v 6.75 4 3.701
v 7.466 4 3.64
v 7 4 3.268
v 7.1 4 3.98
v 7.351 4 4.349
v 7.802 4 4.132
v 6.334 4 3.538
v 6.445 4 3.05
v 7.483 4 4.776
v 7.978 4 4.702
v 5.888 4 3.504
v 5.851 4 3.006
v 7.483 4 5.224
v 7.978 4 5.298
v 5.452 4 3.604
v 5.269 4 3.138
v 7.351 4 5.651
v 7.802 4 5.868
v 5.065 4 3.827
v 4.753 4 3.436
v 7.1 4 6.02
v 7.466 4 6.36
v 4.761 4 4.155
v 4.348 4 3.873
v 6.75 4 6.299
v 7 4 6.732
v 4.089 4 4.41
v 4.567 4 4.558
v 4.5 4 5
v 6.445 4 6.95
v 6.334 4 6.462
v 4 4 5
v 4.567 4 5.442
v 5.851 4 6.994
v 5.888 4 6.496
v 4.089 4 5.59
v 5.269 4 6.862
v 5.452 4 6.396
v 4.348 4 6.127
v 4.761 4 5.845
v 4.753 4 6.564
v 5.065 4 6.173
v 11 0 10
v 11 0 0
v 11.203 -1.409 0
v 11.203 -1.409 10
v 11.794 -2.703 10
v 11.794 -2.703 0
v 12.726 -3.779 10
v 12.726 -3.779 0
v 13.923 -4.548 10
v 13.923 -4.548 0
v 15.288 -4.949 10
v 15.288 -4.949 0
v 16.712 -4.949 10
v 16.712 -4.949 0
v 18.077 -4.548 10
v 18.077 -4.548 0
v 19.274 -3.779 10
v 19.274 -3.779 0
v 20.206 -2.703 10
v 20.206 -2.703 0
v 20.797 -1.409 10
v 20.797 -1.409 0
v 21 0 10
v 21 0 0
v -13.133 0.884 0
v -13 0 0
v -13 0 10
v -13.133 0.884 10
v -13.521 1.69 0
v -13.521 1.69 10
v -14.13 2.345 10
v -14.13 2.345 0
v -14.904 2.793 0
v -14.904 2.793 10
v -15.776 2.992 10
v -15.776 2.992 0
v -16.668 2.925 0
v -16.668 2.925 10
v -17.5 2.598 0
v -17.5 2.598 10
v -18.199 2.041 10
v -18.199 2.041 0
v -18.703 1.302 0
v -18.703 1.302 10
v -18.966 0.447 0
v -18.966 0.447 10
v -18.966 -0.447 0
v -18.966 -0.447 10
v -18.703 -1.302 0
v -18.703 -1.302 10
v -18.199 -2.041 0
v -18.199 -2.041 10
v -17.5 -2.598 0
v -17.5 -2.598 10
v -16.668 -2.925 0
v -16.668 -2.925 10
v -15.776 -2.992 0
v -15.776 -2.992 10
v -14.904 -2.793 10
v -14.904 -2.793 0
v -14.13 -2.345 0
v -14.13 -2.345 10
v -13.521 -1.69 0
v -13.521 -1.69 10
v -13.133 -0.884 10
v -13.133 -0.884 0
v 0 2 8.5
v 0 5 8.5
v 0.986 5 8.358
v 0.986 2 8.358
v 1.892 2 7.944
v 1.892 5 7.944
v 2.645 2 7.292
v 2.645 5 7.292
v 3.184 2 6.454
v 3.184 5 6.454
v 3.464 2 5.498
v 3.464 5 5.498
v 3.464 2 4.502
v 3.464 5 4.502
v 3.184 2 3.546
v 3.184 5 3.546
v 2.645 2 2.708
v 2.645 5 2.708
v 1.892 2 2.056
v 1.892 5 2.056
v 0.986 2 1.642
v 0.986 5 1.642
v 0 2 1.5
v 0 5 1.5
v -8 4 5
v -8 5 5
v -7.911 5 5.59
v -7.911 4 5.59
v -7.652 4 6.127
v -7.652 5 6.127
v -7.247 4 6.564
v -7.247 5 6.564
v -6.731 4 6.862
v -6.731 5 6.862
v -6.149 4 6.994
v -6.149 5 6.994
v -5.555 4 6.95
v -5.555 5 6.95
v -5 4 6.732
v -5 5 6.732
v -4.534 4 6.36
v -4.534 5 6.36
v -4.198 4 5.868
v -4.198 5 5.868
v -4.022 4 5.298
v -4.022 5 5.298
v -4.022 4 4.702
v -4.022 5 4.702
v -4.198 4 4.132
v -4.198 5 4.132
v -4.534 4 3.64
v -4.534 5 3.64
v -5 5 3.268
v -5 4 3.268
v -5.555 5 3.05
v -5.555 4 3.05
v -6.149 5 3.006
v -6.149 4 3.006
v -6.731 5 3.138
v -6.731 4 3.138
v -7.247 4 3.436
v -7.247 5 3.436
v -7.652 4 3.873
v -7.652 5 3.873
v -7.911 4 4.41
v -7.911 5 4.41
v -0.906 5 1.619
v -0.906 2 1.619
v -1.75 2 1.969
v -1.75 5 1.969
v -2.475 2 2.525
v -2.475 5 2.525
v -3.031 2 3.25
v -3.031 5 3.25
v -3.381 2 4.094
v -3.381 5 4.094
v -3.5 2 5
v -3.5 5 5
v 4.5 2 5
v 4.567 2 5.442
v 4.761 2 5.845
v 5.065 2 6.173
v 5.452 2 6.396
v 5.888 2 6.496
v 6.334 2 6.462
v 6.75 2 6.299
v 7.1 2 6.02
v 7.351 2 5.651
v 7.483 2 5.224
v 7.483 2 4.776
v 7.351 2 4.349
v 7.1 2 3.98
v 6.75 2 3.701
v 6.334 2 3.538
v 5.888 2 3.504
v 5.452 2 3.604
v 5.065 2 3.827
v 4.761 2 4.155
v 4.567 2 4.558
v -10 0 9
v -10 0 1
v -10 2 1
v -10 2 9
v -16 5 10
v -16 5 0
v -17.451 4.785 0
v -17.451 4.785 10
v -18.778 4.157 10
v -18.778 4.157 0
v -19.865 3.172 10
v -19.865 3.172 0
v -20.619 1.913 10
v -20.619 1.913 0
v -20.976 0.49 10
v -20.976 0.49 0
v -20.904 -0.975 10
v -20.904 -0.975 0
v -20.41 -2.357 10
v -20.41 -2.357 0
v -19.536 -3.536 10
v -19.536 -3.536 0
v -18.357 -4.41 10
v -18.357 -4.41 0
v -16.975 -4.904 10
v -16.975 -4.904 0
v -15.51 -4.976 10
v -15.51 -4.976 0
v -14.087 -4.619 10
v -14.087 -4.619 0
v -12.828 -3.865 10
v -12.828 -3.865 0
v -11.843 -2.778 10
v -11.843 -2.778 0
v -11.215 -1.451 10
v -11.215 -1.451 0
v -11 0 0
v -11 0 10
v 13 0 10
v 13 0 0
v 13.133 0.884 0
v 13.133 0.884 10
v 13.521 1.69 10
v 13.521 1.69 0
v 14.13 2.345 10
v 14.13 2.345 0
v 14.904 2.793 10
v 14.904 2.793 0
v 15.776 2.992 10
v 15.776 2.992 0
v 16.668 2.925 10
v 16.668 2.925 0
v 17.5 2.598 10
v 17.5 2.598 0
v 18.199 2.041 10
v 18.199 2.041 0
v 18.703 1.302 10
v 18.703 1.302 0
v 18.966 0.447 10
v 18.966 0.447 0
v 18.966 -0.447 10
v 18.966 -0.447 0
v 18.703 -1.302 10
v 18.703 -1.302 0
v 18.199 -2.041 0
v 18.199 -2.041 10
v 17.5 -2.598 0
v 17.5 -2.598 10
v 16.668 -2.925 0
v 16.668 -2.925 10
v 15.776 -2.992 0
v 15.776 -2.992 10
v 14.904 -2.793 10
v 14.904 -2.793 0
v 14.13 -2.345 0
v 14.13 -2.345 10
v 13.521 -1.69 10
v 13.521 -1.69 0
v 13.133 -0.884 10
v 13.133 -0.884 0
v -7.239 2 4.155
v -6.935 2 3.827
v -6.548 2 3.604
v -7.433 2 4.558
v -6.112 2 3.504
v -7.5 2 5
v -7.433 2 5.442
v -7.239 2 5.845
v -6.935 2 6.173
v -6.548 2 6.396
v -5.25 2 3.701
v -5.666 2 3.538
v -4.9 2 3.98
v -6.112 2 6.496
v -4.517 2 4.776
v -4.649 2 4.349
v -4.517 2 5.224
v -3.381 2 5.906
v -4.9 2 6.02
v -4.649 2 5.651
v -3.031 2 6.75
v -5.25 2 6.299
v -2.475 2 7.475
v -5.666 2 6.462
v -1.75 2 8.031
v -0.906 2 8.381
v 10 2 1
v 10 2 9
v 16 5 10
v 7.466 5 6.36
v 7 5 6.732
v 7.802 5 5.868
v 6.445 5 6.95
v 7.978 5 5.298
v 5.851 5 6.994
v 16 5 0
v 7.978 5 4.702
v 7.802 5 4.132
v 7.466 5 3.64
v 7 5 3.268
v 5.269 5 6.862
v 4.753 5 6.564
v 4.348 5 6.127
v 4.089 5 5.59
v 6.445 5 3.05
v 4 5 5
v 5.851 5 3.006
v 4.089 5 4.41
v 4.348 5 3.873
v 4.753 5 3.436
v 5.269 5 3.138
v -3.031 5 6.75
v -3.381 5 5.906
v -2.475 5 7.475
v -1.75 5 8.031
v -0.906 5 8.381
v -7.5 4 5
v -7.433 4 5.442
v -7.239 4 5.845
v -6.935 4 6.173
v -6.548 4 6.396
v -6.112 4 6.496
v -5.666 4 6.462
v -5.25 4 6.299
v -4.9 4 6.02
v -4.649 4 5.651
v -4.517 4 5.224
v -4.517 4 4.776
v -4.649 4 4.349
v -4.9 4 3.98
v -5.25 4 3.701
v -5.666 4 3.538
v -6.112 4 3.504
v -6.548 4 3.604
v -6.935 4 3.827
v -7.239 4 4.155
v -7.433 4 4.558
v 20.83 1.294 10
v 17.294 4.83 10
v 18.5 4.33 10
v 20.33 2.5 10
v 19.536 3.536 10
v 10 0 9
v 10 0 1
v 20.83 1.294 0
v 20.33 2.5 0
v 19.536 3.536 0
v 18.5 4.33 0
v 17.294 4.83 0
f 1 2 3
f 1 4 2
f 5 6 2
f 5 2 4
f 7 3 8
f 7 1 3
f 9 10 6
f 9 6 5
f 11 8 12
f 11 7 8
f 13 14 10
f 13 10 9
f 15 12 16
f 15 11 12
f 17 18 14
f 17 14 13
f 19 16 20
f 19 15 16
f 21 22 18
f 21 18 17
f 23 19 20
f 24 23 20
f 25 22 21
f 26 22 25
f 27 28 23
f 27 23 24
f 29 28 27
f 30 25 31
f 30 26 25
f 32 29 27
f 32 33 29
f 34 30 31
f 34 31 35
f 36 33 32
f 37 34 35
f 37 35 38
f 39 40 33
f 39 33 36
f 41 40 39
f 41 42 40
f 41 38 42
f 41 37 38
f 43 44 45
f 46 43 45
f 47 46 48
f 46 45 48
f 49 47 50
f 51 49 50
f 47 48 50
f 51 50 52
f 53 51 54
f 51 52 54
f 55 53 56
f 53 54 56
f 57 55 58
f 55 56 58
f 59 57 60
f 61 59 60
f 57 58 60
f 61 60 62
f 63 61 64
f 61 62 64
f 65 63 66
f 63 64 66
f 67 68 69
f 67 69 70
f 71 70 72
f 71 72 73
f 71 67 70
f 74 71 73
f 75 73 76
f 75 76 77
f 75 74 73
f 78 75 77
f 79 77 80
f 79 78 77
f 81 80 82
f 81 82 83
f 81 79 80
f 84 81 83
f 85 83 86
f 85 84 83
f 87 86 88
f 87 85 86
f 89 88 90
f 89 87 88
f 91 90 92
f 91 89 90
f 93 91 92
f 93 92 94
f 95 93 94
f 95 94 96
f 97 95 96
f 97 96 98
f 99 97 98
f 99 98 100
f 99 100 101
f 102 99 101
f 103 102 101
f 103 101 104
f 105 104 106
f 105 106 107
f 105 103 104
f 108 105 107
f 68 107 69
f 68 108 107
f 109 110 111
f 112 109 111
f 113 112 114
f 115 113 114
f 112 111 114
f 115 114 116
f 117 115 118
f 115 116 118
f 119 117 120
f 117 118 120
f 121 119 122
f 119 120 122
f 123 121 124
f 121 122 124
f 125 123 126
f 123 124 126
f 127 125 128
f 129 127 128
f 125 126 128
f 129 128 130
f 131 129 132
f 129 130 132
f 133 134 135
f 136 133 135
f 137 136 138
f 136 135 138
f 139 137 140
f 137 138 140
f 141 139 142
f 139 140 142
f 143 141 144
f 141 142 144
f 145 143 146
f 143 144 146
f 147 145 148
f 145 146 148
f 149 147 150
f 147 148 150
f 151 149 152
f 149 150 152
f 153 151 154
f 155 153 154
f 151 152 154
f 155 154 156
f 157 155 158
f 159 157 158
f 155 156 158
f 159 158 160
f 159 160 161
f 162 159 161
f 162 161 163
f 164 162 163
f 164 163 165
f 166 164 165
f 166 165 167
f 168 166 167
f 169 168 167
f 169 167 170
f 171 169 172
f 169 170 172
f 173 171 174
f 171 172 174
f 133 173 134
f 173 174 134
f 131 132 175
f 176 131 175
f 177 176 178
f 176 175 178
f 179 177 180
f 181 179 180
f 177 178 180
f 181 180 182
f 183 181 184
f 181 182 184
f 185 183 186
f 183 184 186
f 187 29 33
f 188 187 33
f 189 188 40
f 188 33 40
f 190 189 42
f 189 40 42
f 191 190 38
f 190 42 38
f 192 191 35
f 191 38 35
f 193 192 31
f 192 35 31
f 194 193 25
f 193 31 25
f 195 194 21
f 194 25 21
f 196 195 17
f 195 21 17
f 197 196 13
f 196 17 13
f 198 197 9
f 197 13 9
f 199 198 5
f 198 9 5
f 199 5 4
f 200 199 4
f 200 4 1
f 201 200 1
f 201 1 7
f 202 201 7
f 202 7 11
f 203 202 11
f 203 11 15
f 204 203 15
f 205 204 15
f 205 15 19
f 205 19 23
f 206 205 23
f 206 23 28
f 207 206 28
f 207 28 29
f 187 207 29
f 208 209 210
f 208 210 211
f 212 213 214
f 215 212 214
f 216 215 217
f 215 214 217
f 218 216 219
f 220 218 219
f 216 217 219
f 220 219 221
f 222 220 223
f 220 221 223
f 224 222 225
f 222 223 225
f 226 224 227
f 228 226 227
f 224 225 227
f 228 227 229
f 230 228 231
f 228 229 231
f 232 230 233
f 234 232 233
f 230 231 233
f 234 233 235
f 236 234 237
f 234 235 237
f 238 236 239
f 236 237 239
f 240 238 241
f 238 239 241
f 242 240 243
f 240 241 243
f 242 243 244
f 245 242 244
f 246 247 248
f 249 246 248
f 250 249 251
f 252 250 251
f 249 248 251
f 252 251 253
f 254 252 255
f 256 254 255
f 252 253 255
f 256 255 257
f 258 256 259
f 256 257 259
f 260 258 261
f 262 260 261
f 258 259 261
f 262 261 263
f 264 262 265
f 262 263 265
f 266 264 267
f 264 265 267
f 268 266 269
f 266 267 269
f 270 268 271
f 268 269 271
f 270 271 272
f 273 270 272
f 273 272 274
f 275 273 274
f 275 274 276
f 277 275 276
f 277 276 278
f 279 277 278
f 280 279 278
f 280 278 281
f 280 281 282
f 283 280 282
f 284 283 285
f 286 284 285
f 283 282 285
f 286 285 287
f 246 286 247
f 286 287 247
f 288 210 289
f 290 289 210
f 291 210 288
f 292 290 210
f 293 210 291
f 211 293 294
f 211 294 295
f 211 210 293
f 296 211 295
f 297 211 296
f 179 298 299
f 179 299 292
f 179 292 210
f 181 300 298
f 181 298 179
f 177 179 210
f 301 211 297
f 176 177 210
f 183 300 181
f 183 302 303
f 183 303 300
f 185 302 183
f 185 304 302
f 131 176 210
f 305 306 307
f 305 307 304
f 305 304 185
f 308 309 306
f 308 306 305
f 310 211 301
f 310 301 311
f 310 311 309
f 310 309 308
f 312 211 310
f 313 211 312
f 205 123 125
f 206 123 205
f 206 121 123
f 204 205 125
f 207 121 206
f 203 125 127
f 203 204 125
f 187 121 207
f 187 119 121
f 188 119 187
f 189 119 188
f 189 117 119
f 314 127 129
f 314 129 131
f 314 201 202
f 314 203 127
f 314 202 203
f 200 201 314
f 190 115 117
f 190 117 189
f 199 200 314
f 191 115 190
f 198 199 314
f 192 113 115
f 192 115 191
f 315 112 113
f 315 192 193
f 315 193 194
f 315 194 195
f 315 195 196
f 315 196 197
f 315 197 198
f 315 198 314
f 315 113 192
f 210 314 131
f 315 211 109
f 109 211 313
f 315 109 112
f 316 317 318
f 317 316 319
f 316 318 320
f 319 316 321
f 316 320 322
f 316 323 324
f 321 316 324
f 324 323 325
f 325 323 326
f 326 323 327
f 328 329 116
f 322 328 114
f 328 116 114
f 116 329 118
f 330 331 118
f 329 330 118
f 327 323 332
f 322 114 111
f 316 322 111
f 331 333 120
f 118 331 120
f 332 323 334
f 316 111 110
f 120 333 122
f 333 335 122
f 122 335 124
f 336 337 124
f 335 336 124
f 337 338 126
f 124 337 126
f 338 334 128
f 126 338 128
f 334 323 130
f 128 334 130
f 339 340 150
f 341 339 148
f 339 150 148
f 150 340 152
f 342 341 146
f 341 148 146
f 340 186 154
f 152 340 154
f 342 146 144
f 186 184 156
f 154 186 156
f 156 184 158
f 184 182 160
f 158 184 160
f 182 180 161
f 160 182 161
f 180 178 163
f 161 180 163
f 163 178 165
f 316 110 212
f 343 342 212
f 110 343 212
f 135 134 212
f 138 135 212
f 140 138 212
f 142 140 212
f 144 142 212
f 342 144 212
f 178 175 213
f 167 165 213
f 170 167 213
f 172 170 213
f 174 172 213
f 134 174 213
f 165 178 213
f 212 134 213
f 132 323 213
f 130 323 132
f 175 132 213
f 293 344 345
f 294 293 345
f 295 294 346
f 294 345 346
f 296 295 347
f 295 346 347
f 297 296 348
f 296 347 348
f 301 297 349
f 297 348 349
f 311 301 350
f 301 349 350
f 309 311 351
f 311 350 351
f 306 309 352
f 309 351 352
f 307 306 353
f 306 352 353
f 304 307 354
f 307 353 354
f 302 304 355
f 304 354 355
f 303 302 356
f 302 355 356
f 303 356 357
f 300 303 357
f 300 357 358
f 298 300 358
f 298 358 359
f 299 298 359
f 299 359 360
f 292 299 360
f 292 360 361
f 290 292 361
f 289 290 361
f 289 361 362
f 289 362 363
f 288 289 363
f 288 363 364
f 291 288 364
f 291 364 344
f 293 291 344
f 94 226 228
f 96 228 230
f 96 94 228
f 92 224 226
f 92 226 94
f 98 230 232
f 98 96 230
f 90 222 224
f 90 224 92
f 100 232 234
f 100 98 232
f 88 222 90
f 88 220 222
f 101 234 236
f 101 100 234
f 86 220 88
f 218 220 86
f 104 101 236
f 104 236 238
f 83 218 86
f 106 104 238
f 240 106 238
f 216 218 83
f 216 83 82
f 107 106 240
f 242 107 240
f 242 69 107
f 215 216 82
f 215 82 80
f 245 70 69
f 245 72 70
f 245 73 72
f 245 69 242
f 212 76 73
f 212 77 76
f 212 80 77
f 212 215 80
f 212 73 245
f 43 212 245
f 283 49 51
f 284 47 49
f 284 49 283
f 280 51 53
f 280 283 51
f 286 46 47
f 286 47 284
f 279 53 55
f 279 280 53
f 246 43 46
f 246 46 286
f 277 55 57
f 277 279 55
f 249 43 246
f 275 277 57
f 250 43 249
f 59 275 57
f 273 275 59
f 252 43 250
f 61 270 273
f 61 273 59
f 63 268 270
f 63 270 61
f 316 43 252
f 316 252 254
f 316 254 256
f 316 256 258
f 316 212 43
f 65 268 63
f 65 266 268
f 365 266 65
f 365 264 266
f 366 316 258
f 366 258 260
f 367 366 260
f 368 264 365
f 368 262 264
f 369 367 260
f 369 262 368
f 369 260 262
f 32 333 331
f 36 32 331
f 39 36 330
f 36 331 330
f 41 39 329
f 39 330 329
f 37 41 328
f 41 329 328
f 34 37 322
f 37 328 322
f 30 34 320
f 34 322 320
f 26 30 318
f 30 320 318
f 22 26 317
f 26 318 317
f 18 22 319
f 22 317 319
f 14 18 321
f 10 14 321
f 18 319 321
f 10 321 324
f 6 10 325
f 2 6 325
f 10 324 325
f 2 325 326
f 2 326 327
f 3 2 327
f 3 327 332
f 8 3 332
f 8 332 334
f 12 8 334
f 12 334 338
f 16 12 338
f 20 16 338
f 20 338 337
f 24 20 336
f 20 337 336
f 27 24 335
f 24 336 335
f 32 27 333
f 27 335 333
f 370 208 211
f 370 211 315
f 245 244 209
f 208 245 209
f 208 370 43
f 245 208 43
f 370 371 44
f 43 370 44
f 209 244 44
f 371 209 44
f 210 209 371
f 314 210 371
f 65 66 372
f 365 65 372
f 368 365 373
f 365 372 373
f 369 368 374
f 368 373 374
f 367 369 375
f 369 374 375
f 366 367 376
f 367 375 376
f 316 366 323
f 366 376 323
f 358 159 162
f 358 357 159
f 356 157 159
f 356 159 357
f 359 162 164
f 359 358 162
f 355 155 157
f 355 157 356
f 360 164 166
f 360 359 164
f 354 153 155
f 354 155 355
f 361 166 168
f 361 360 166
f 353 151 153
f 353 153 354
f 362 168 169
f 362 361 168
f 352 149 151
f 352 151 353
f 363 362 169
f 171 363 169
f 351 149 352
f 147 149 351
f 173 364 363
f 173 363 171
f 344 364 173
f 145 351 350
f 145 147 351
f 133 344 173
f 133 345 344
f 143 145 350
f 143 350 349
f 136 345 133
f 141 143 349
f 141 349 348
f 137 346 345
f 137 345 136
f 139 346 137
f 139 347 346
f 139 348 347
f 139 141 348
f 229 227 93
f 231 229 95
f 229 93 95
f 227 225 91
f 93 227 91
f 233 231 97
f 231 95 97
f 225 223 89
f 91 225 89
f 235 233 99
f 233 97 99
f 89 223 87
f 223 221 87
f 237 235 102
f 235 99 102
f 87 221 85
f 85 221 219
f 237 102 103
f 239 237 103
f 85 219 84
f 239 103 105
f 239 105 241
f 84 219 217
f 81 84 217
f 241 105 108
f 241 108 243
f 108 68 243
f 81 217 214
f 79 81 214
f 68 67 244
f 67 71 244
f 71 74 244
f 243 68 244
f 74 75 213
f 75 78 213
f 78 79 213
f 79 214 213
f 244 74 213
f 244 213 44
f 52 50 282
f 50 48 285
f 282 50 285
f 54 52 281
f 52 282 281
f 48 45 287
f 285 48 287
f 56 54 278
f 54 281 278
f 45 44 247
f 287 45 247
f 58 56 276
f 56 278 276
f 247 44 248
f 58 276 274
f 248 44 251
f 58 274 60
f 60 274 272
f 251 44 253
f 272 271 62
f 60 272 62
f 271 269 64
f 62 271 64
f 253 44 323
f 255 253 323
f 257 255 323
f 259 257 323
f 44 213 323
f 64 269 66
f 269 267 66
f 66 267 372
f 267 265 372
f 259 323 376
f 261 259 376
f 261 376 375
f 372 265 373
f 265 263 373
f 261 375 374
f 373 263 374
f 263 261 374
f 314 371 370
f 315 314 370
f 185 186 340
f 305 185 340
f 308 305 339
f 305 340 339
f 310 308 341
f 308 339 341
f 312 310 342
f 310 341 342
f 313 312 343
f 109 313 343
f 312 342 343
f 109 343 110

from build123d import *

# Parameters (mm, degrees)
F0_R     = 3
F1_DEPTH = 10
F2_W     = 20
F2_H     = 8
F3_DEPTH = 2
F4_R     = 1.5
F5_DEPTH = 5
F6_R     = 2
F7_DEPTH = 1


with BuildPart() as f1:
    # F0 (on Top) → F1 (new body)
    with BuildSketch(Plane.XY):
        with BuildLine():
            ThreePointArc((-16, 5), (-19.5355339059, -3.5355339059), (-11, 0))
            ThreePointArc((-11, 0), (-12.4644660941, 3.5355339059), (-16, 5))
        make_face()
        with Locations((-16, 0)):
            Circle(F0_R, mode=Mode.SUBTRACT)
        with BuildLine():
            ThreePointArc((-16, 5), (-12.4644660941, 3.5355339059), (-11, 0))
            Line((-11, 0), (11, 0))
            ThreePointArc((11, 0), (12.4644660941, 3.5355339059), (16, 5))
            Line((16, 5), (-16, 5))
        make_face()
        with BuildLine():
            ThreePointArc((16, 5), (12.4644660941, 3.5355339059), (11, 0))
            ThreePointArc((11, 0), (16, -5), (21, 0))
            ThreePointArc((21, 0), (19.5355339059, 3.5355339059), (16, 5))
        make_face()
        with BuildLine():
            ThreePointArc((19, 0), (16, -3), (13, 0))
            ThreePointArc((13, 0), (16, 3), (19, 0))
        make_face(mode=Mode.SUBTRACT)
    extrude(amount=F1_DEPTH)

    # F2 (on face) → F3 (cut)
    with BuildSketch(Plane.XZ):
        with Locations((0, 5)):
            Rectangle(F2_W, F2_H)
    extrude(amount=-F3_DEPTH, mode=Mode.SUBTRACT)

    # F4 (on face) → F5 (cut)
    with BuildSketch(Plane(origin=(0, 5, 0), x_dir=(-1, 0, 0), z_dir=(0, 1, 0))):
        with BuildLine():
            ThreePointArc((3.5, 5), (2.4748737342, 7.4748737342), (0, 8.5))
            Line((0, 8.5), (0, 1.5))
            ThreePointArc((0, 1.5), (2.4748737342, 2.5251262658), (3.5, 5))
        make_face()
        with BuildLine():
            Line((0, 1.5), (0, 8.5))
            ThreePointArc((0, 8.5), (-3.5, 5), (0, 1.5))
        make_face()
        with Locations((6, 5)):
            Circle(F4_R)
        with Locations((-6, 5)):
            Circle(F4_R)
    extrude(amount=-F5_DEPTH, mode=Mode.SUBTRACT)

    # F6 (on face) → F7 (cut)
    with BuildSketch(Plane(origin=(0, 5, 0), x_dir=(-1, 0, 0), z_dir=(0, 1, 0))):
        with Locations((-6, 5)):
            Circle(F6_R)
        with Locations((6, 5)):
            Circle(F6_R)
    extrude(amount=-F7_DEPTH, mode=Mode.SUBTRACT)


solid = f1.part
